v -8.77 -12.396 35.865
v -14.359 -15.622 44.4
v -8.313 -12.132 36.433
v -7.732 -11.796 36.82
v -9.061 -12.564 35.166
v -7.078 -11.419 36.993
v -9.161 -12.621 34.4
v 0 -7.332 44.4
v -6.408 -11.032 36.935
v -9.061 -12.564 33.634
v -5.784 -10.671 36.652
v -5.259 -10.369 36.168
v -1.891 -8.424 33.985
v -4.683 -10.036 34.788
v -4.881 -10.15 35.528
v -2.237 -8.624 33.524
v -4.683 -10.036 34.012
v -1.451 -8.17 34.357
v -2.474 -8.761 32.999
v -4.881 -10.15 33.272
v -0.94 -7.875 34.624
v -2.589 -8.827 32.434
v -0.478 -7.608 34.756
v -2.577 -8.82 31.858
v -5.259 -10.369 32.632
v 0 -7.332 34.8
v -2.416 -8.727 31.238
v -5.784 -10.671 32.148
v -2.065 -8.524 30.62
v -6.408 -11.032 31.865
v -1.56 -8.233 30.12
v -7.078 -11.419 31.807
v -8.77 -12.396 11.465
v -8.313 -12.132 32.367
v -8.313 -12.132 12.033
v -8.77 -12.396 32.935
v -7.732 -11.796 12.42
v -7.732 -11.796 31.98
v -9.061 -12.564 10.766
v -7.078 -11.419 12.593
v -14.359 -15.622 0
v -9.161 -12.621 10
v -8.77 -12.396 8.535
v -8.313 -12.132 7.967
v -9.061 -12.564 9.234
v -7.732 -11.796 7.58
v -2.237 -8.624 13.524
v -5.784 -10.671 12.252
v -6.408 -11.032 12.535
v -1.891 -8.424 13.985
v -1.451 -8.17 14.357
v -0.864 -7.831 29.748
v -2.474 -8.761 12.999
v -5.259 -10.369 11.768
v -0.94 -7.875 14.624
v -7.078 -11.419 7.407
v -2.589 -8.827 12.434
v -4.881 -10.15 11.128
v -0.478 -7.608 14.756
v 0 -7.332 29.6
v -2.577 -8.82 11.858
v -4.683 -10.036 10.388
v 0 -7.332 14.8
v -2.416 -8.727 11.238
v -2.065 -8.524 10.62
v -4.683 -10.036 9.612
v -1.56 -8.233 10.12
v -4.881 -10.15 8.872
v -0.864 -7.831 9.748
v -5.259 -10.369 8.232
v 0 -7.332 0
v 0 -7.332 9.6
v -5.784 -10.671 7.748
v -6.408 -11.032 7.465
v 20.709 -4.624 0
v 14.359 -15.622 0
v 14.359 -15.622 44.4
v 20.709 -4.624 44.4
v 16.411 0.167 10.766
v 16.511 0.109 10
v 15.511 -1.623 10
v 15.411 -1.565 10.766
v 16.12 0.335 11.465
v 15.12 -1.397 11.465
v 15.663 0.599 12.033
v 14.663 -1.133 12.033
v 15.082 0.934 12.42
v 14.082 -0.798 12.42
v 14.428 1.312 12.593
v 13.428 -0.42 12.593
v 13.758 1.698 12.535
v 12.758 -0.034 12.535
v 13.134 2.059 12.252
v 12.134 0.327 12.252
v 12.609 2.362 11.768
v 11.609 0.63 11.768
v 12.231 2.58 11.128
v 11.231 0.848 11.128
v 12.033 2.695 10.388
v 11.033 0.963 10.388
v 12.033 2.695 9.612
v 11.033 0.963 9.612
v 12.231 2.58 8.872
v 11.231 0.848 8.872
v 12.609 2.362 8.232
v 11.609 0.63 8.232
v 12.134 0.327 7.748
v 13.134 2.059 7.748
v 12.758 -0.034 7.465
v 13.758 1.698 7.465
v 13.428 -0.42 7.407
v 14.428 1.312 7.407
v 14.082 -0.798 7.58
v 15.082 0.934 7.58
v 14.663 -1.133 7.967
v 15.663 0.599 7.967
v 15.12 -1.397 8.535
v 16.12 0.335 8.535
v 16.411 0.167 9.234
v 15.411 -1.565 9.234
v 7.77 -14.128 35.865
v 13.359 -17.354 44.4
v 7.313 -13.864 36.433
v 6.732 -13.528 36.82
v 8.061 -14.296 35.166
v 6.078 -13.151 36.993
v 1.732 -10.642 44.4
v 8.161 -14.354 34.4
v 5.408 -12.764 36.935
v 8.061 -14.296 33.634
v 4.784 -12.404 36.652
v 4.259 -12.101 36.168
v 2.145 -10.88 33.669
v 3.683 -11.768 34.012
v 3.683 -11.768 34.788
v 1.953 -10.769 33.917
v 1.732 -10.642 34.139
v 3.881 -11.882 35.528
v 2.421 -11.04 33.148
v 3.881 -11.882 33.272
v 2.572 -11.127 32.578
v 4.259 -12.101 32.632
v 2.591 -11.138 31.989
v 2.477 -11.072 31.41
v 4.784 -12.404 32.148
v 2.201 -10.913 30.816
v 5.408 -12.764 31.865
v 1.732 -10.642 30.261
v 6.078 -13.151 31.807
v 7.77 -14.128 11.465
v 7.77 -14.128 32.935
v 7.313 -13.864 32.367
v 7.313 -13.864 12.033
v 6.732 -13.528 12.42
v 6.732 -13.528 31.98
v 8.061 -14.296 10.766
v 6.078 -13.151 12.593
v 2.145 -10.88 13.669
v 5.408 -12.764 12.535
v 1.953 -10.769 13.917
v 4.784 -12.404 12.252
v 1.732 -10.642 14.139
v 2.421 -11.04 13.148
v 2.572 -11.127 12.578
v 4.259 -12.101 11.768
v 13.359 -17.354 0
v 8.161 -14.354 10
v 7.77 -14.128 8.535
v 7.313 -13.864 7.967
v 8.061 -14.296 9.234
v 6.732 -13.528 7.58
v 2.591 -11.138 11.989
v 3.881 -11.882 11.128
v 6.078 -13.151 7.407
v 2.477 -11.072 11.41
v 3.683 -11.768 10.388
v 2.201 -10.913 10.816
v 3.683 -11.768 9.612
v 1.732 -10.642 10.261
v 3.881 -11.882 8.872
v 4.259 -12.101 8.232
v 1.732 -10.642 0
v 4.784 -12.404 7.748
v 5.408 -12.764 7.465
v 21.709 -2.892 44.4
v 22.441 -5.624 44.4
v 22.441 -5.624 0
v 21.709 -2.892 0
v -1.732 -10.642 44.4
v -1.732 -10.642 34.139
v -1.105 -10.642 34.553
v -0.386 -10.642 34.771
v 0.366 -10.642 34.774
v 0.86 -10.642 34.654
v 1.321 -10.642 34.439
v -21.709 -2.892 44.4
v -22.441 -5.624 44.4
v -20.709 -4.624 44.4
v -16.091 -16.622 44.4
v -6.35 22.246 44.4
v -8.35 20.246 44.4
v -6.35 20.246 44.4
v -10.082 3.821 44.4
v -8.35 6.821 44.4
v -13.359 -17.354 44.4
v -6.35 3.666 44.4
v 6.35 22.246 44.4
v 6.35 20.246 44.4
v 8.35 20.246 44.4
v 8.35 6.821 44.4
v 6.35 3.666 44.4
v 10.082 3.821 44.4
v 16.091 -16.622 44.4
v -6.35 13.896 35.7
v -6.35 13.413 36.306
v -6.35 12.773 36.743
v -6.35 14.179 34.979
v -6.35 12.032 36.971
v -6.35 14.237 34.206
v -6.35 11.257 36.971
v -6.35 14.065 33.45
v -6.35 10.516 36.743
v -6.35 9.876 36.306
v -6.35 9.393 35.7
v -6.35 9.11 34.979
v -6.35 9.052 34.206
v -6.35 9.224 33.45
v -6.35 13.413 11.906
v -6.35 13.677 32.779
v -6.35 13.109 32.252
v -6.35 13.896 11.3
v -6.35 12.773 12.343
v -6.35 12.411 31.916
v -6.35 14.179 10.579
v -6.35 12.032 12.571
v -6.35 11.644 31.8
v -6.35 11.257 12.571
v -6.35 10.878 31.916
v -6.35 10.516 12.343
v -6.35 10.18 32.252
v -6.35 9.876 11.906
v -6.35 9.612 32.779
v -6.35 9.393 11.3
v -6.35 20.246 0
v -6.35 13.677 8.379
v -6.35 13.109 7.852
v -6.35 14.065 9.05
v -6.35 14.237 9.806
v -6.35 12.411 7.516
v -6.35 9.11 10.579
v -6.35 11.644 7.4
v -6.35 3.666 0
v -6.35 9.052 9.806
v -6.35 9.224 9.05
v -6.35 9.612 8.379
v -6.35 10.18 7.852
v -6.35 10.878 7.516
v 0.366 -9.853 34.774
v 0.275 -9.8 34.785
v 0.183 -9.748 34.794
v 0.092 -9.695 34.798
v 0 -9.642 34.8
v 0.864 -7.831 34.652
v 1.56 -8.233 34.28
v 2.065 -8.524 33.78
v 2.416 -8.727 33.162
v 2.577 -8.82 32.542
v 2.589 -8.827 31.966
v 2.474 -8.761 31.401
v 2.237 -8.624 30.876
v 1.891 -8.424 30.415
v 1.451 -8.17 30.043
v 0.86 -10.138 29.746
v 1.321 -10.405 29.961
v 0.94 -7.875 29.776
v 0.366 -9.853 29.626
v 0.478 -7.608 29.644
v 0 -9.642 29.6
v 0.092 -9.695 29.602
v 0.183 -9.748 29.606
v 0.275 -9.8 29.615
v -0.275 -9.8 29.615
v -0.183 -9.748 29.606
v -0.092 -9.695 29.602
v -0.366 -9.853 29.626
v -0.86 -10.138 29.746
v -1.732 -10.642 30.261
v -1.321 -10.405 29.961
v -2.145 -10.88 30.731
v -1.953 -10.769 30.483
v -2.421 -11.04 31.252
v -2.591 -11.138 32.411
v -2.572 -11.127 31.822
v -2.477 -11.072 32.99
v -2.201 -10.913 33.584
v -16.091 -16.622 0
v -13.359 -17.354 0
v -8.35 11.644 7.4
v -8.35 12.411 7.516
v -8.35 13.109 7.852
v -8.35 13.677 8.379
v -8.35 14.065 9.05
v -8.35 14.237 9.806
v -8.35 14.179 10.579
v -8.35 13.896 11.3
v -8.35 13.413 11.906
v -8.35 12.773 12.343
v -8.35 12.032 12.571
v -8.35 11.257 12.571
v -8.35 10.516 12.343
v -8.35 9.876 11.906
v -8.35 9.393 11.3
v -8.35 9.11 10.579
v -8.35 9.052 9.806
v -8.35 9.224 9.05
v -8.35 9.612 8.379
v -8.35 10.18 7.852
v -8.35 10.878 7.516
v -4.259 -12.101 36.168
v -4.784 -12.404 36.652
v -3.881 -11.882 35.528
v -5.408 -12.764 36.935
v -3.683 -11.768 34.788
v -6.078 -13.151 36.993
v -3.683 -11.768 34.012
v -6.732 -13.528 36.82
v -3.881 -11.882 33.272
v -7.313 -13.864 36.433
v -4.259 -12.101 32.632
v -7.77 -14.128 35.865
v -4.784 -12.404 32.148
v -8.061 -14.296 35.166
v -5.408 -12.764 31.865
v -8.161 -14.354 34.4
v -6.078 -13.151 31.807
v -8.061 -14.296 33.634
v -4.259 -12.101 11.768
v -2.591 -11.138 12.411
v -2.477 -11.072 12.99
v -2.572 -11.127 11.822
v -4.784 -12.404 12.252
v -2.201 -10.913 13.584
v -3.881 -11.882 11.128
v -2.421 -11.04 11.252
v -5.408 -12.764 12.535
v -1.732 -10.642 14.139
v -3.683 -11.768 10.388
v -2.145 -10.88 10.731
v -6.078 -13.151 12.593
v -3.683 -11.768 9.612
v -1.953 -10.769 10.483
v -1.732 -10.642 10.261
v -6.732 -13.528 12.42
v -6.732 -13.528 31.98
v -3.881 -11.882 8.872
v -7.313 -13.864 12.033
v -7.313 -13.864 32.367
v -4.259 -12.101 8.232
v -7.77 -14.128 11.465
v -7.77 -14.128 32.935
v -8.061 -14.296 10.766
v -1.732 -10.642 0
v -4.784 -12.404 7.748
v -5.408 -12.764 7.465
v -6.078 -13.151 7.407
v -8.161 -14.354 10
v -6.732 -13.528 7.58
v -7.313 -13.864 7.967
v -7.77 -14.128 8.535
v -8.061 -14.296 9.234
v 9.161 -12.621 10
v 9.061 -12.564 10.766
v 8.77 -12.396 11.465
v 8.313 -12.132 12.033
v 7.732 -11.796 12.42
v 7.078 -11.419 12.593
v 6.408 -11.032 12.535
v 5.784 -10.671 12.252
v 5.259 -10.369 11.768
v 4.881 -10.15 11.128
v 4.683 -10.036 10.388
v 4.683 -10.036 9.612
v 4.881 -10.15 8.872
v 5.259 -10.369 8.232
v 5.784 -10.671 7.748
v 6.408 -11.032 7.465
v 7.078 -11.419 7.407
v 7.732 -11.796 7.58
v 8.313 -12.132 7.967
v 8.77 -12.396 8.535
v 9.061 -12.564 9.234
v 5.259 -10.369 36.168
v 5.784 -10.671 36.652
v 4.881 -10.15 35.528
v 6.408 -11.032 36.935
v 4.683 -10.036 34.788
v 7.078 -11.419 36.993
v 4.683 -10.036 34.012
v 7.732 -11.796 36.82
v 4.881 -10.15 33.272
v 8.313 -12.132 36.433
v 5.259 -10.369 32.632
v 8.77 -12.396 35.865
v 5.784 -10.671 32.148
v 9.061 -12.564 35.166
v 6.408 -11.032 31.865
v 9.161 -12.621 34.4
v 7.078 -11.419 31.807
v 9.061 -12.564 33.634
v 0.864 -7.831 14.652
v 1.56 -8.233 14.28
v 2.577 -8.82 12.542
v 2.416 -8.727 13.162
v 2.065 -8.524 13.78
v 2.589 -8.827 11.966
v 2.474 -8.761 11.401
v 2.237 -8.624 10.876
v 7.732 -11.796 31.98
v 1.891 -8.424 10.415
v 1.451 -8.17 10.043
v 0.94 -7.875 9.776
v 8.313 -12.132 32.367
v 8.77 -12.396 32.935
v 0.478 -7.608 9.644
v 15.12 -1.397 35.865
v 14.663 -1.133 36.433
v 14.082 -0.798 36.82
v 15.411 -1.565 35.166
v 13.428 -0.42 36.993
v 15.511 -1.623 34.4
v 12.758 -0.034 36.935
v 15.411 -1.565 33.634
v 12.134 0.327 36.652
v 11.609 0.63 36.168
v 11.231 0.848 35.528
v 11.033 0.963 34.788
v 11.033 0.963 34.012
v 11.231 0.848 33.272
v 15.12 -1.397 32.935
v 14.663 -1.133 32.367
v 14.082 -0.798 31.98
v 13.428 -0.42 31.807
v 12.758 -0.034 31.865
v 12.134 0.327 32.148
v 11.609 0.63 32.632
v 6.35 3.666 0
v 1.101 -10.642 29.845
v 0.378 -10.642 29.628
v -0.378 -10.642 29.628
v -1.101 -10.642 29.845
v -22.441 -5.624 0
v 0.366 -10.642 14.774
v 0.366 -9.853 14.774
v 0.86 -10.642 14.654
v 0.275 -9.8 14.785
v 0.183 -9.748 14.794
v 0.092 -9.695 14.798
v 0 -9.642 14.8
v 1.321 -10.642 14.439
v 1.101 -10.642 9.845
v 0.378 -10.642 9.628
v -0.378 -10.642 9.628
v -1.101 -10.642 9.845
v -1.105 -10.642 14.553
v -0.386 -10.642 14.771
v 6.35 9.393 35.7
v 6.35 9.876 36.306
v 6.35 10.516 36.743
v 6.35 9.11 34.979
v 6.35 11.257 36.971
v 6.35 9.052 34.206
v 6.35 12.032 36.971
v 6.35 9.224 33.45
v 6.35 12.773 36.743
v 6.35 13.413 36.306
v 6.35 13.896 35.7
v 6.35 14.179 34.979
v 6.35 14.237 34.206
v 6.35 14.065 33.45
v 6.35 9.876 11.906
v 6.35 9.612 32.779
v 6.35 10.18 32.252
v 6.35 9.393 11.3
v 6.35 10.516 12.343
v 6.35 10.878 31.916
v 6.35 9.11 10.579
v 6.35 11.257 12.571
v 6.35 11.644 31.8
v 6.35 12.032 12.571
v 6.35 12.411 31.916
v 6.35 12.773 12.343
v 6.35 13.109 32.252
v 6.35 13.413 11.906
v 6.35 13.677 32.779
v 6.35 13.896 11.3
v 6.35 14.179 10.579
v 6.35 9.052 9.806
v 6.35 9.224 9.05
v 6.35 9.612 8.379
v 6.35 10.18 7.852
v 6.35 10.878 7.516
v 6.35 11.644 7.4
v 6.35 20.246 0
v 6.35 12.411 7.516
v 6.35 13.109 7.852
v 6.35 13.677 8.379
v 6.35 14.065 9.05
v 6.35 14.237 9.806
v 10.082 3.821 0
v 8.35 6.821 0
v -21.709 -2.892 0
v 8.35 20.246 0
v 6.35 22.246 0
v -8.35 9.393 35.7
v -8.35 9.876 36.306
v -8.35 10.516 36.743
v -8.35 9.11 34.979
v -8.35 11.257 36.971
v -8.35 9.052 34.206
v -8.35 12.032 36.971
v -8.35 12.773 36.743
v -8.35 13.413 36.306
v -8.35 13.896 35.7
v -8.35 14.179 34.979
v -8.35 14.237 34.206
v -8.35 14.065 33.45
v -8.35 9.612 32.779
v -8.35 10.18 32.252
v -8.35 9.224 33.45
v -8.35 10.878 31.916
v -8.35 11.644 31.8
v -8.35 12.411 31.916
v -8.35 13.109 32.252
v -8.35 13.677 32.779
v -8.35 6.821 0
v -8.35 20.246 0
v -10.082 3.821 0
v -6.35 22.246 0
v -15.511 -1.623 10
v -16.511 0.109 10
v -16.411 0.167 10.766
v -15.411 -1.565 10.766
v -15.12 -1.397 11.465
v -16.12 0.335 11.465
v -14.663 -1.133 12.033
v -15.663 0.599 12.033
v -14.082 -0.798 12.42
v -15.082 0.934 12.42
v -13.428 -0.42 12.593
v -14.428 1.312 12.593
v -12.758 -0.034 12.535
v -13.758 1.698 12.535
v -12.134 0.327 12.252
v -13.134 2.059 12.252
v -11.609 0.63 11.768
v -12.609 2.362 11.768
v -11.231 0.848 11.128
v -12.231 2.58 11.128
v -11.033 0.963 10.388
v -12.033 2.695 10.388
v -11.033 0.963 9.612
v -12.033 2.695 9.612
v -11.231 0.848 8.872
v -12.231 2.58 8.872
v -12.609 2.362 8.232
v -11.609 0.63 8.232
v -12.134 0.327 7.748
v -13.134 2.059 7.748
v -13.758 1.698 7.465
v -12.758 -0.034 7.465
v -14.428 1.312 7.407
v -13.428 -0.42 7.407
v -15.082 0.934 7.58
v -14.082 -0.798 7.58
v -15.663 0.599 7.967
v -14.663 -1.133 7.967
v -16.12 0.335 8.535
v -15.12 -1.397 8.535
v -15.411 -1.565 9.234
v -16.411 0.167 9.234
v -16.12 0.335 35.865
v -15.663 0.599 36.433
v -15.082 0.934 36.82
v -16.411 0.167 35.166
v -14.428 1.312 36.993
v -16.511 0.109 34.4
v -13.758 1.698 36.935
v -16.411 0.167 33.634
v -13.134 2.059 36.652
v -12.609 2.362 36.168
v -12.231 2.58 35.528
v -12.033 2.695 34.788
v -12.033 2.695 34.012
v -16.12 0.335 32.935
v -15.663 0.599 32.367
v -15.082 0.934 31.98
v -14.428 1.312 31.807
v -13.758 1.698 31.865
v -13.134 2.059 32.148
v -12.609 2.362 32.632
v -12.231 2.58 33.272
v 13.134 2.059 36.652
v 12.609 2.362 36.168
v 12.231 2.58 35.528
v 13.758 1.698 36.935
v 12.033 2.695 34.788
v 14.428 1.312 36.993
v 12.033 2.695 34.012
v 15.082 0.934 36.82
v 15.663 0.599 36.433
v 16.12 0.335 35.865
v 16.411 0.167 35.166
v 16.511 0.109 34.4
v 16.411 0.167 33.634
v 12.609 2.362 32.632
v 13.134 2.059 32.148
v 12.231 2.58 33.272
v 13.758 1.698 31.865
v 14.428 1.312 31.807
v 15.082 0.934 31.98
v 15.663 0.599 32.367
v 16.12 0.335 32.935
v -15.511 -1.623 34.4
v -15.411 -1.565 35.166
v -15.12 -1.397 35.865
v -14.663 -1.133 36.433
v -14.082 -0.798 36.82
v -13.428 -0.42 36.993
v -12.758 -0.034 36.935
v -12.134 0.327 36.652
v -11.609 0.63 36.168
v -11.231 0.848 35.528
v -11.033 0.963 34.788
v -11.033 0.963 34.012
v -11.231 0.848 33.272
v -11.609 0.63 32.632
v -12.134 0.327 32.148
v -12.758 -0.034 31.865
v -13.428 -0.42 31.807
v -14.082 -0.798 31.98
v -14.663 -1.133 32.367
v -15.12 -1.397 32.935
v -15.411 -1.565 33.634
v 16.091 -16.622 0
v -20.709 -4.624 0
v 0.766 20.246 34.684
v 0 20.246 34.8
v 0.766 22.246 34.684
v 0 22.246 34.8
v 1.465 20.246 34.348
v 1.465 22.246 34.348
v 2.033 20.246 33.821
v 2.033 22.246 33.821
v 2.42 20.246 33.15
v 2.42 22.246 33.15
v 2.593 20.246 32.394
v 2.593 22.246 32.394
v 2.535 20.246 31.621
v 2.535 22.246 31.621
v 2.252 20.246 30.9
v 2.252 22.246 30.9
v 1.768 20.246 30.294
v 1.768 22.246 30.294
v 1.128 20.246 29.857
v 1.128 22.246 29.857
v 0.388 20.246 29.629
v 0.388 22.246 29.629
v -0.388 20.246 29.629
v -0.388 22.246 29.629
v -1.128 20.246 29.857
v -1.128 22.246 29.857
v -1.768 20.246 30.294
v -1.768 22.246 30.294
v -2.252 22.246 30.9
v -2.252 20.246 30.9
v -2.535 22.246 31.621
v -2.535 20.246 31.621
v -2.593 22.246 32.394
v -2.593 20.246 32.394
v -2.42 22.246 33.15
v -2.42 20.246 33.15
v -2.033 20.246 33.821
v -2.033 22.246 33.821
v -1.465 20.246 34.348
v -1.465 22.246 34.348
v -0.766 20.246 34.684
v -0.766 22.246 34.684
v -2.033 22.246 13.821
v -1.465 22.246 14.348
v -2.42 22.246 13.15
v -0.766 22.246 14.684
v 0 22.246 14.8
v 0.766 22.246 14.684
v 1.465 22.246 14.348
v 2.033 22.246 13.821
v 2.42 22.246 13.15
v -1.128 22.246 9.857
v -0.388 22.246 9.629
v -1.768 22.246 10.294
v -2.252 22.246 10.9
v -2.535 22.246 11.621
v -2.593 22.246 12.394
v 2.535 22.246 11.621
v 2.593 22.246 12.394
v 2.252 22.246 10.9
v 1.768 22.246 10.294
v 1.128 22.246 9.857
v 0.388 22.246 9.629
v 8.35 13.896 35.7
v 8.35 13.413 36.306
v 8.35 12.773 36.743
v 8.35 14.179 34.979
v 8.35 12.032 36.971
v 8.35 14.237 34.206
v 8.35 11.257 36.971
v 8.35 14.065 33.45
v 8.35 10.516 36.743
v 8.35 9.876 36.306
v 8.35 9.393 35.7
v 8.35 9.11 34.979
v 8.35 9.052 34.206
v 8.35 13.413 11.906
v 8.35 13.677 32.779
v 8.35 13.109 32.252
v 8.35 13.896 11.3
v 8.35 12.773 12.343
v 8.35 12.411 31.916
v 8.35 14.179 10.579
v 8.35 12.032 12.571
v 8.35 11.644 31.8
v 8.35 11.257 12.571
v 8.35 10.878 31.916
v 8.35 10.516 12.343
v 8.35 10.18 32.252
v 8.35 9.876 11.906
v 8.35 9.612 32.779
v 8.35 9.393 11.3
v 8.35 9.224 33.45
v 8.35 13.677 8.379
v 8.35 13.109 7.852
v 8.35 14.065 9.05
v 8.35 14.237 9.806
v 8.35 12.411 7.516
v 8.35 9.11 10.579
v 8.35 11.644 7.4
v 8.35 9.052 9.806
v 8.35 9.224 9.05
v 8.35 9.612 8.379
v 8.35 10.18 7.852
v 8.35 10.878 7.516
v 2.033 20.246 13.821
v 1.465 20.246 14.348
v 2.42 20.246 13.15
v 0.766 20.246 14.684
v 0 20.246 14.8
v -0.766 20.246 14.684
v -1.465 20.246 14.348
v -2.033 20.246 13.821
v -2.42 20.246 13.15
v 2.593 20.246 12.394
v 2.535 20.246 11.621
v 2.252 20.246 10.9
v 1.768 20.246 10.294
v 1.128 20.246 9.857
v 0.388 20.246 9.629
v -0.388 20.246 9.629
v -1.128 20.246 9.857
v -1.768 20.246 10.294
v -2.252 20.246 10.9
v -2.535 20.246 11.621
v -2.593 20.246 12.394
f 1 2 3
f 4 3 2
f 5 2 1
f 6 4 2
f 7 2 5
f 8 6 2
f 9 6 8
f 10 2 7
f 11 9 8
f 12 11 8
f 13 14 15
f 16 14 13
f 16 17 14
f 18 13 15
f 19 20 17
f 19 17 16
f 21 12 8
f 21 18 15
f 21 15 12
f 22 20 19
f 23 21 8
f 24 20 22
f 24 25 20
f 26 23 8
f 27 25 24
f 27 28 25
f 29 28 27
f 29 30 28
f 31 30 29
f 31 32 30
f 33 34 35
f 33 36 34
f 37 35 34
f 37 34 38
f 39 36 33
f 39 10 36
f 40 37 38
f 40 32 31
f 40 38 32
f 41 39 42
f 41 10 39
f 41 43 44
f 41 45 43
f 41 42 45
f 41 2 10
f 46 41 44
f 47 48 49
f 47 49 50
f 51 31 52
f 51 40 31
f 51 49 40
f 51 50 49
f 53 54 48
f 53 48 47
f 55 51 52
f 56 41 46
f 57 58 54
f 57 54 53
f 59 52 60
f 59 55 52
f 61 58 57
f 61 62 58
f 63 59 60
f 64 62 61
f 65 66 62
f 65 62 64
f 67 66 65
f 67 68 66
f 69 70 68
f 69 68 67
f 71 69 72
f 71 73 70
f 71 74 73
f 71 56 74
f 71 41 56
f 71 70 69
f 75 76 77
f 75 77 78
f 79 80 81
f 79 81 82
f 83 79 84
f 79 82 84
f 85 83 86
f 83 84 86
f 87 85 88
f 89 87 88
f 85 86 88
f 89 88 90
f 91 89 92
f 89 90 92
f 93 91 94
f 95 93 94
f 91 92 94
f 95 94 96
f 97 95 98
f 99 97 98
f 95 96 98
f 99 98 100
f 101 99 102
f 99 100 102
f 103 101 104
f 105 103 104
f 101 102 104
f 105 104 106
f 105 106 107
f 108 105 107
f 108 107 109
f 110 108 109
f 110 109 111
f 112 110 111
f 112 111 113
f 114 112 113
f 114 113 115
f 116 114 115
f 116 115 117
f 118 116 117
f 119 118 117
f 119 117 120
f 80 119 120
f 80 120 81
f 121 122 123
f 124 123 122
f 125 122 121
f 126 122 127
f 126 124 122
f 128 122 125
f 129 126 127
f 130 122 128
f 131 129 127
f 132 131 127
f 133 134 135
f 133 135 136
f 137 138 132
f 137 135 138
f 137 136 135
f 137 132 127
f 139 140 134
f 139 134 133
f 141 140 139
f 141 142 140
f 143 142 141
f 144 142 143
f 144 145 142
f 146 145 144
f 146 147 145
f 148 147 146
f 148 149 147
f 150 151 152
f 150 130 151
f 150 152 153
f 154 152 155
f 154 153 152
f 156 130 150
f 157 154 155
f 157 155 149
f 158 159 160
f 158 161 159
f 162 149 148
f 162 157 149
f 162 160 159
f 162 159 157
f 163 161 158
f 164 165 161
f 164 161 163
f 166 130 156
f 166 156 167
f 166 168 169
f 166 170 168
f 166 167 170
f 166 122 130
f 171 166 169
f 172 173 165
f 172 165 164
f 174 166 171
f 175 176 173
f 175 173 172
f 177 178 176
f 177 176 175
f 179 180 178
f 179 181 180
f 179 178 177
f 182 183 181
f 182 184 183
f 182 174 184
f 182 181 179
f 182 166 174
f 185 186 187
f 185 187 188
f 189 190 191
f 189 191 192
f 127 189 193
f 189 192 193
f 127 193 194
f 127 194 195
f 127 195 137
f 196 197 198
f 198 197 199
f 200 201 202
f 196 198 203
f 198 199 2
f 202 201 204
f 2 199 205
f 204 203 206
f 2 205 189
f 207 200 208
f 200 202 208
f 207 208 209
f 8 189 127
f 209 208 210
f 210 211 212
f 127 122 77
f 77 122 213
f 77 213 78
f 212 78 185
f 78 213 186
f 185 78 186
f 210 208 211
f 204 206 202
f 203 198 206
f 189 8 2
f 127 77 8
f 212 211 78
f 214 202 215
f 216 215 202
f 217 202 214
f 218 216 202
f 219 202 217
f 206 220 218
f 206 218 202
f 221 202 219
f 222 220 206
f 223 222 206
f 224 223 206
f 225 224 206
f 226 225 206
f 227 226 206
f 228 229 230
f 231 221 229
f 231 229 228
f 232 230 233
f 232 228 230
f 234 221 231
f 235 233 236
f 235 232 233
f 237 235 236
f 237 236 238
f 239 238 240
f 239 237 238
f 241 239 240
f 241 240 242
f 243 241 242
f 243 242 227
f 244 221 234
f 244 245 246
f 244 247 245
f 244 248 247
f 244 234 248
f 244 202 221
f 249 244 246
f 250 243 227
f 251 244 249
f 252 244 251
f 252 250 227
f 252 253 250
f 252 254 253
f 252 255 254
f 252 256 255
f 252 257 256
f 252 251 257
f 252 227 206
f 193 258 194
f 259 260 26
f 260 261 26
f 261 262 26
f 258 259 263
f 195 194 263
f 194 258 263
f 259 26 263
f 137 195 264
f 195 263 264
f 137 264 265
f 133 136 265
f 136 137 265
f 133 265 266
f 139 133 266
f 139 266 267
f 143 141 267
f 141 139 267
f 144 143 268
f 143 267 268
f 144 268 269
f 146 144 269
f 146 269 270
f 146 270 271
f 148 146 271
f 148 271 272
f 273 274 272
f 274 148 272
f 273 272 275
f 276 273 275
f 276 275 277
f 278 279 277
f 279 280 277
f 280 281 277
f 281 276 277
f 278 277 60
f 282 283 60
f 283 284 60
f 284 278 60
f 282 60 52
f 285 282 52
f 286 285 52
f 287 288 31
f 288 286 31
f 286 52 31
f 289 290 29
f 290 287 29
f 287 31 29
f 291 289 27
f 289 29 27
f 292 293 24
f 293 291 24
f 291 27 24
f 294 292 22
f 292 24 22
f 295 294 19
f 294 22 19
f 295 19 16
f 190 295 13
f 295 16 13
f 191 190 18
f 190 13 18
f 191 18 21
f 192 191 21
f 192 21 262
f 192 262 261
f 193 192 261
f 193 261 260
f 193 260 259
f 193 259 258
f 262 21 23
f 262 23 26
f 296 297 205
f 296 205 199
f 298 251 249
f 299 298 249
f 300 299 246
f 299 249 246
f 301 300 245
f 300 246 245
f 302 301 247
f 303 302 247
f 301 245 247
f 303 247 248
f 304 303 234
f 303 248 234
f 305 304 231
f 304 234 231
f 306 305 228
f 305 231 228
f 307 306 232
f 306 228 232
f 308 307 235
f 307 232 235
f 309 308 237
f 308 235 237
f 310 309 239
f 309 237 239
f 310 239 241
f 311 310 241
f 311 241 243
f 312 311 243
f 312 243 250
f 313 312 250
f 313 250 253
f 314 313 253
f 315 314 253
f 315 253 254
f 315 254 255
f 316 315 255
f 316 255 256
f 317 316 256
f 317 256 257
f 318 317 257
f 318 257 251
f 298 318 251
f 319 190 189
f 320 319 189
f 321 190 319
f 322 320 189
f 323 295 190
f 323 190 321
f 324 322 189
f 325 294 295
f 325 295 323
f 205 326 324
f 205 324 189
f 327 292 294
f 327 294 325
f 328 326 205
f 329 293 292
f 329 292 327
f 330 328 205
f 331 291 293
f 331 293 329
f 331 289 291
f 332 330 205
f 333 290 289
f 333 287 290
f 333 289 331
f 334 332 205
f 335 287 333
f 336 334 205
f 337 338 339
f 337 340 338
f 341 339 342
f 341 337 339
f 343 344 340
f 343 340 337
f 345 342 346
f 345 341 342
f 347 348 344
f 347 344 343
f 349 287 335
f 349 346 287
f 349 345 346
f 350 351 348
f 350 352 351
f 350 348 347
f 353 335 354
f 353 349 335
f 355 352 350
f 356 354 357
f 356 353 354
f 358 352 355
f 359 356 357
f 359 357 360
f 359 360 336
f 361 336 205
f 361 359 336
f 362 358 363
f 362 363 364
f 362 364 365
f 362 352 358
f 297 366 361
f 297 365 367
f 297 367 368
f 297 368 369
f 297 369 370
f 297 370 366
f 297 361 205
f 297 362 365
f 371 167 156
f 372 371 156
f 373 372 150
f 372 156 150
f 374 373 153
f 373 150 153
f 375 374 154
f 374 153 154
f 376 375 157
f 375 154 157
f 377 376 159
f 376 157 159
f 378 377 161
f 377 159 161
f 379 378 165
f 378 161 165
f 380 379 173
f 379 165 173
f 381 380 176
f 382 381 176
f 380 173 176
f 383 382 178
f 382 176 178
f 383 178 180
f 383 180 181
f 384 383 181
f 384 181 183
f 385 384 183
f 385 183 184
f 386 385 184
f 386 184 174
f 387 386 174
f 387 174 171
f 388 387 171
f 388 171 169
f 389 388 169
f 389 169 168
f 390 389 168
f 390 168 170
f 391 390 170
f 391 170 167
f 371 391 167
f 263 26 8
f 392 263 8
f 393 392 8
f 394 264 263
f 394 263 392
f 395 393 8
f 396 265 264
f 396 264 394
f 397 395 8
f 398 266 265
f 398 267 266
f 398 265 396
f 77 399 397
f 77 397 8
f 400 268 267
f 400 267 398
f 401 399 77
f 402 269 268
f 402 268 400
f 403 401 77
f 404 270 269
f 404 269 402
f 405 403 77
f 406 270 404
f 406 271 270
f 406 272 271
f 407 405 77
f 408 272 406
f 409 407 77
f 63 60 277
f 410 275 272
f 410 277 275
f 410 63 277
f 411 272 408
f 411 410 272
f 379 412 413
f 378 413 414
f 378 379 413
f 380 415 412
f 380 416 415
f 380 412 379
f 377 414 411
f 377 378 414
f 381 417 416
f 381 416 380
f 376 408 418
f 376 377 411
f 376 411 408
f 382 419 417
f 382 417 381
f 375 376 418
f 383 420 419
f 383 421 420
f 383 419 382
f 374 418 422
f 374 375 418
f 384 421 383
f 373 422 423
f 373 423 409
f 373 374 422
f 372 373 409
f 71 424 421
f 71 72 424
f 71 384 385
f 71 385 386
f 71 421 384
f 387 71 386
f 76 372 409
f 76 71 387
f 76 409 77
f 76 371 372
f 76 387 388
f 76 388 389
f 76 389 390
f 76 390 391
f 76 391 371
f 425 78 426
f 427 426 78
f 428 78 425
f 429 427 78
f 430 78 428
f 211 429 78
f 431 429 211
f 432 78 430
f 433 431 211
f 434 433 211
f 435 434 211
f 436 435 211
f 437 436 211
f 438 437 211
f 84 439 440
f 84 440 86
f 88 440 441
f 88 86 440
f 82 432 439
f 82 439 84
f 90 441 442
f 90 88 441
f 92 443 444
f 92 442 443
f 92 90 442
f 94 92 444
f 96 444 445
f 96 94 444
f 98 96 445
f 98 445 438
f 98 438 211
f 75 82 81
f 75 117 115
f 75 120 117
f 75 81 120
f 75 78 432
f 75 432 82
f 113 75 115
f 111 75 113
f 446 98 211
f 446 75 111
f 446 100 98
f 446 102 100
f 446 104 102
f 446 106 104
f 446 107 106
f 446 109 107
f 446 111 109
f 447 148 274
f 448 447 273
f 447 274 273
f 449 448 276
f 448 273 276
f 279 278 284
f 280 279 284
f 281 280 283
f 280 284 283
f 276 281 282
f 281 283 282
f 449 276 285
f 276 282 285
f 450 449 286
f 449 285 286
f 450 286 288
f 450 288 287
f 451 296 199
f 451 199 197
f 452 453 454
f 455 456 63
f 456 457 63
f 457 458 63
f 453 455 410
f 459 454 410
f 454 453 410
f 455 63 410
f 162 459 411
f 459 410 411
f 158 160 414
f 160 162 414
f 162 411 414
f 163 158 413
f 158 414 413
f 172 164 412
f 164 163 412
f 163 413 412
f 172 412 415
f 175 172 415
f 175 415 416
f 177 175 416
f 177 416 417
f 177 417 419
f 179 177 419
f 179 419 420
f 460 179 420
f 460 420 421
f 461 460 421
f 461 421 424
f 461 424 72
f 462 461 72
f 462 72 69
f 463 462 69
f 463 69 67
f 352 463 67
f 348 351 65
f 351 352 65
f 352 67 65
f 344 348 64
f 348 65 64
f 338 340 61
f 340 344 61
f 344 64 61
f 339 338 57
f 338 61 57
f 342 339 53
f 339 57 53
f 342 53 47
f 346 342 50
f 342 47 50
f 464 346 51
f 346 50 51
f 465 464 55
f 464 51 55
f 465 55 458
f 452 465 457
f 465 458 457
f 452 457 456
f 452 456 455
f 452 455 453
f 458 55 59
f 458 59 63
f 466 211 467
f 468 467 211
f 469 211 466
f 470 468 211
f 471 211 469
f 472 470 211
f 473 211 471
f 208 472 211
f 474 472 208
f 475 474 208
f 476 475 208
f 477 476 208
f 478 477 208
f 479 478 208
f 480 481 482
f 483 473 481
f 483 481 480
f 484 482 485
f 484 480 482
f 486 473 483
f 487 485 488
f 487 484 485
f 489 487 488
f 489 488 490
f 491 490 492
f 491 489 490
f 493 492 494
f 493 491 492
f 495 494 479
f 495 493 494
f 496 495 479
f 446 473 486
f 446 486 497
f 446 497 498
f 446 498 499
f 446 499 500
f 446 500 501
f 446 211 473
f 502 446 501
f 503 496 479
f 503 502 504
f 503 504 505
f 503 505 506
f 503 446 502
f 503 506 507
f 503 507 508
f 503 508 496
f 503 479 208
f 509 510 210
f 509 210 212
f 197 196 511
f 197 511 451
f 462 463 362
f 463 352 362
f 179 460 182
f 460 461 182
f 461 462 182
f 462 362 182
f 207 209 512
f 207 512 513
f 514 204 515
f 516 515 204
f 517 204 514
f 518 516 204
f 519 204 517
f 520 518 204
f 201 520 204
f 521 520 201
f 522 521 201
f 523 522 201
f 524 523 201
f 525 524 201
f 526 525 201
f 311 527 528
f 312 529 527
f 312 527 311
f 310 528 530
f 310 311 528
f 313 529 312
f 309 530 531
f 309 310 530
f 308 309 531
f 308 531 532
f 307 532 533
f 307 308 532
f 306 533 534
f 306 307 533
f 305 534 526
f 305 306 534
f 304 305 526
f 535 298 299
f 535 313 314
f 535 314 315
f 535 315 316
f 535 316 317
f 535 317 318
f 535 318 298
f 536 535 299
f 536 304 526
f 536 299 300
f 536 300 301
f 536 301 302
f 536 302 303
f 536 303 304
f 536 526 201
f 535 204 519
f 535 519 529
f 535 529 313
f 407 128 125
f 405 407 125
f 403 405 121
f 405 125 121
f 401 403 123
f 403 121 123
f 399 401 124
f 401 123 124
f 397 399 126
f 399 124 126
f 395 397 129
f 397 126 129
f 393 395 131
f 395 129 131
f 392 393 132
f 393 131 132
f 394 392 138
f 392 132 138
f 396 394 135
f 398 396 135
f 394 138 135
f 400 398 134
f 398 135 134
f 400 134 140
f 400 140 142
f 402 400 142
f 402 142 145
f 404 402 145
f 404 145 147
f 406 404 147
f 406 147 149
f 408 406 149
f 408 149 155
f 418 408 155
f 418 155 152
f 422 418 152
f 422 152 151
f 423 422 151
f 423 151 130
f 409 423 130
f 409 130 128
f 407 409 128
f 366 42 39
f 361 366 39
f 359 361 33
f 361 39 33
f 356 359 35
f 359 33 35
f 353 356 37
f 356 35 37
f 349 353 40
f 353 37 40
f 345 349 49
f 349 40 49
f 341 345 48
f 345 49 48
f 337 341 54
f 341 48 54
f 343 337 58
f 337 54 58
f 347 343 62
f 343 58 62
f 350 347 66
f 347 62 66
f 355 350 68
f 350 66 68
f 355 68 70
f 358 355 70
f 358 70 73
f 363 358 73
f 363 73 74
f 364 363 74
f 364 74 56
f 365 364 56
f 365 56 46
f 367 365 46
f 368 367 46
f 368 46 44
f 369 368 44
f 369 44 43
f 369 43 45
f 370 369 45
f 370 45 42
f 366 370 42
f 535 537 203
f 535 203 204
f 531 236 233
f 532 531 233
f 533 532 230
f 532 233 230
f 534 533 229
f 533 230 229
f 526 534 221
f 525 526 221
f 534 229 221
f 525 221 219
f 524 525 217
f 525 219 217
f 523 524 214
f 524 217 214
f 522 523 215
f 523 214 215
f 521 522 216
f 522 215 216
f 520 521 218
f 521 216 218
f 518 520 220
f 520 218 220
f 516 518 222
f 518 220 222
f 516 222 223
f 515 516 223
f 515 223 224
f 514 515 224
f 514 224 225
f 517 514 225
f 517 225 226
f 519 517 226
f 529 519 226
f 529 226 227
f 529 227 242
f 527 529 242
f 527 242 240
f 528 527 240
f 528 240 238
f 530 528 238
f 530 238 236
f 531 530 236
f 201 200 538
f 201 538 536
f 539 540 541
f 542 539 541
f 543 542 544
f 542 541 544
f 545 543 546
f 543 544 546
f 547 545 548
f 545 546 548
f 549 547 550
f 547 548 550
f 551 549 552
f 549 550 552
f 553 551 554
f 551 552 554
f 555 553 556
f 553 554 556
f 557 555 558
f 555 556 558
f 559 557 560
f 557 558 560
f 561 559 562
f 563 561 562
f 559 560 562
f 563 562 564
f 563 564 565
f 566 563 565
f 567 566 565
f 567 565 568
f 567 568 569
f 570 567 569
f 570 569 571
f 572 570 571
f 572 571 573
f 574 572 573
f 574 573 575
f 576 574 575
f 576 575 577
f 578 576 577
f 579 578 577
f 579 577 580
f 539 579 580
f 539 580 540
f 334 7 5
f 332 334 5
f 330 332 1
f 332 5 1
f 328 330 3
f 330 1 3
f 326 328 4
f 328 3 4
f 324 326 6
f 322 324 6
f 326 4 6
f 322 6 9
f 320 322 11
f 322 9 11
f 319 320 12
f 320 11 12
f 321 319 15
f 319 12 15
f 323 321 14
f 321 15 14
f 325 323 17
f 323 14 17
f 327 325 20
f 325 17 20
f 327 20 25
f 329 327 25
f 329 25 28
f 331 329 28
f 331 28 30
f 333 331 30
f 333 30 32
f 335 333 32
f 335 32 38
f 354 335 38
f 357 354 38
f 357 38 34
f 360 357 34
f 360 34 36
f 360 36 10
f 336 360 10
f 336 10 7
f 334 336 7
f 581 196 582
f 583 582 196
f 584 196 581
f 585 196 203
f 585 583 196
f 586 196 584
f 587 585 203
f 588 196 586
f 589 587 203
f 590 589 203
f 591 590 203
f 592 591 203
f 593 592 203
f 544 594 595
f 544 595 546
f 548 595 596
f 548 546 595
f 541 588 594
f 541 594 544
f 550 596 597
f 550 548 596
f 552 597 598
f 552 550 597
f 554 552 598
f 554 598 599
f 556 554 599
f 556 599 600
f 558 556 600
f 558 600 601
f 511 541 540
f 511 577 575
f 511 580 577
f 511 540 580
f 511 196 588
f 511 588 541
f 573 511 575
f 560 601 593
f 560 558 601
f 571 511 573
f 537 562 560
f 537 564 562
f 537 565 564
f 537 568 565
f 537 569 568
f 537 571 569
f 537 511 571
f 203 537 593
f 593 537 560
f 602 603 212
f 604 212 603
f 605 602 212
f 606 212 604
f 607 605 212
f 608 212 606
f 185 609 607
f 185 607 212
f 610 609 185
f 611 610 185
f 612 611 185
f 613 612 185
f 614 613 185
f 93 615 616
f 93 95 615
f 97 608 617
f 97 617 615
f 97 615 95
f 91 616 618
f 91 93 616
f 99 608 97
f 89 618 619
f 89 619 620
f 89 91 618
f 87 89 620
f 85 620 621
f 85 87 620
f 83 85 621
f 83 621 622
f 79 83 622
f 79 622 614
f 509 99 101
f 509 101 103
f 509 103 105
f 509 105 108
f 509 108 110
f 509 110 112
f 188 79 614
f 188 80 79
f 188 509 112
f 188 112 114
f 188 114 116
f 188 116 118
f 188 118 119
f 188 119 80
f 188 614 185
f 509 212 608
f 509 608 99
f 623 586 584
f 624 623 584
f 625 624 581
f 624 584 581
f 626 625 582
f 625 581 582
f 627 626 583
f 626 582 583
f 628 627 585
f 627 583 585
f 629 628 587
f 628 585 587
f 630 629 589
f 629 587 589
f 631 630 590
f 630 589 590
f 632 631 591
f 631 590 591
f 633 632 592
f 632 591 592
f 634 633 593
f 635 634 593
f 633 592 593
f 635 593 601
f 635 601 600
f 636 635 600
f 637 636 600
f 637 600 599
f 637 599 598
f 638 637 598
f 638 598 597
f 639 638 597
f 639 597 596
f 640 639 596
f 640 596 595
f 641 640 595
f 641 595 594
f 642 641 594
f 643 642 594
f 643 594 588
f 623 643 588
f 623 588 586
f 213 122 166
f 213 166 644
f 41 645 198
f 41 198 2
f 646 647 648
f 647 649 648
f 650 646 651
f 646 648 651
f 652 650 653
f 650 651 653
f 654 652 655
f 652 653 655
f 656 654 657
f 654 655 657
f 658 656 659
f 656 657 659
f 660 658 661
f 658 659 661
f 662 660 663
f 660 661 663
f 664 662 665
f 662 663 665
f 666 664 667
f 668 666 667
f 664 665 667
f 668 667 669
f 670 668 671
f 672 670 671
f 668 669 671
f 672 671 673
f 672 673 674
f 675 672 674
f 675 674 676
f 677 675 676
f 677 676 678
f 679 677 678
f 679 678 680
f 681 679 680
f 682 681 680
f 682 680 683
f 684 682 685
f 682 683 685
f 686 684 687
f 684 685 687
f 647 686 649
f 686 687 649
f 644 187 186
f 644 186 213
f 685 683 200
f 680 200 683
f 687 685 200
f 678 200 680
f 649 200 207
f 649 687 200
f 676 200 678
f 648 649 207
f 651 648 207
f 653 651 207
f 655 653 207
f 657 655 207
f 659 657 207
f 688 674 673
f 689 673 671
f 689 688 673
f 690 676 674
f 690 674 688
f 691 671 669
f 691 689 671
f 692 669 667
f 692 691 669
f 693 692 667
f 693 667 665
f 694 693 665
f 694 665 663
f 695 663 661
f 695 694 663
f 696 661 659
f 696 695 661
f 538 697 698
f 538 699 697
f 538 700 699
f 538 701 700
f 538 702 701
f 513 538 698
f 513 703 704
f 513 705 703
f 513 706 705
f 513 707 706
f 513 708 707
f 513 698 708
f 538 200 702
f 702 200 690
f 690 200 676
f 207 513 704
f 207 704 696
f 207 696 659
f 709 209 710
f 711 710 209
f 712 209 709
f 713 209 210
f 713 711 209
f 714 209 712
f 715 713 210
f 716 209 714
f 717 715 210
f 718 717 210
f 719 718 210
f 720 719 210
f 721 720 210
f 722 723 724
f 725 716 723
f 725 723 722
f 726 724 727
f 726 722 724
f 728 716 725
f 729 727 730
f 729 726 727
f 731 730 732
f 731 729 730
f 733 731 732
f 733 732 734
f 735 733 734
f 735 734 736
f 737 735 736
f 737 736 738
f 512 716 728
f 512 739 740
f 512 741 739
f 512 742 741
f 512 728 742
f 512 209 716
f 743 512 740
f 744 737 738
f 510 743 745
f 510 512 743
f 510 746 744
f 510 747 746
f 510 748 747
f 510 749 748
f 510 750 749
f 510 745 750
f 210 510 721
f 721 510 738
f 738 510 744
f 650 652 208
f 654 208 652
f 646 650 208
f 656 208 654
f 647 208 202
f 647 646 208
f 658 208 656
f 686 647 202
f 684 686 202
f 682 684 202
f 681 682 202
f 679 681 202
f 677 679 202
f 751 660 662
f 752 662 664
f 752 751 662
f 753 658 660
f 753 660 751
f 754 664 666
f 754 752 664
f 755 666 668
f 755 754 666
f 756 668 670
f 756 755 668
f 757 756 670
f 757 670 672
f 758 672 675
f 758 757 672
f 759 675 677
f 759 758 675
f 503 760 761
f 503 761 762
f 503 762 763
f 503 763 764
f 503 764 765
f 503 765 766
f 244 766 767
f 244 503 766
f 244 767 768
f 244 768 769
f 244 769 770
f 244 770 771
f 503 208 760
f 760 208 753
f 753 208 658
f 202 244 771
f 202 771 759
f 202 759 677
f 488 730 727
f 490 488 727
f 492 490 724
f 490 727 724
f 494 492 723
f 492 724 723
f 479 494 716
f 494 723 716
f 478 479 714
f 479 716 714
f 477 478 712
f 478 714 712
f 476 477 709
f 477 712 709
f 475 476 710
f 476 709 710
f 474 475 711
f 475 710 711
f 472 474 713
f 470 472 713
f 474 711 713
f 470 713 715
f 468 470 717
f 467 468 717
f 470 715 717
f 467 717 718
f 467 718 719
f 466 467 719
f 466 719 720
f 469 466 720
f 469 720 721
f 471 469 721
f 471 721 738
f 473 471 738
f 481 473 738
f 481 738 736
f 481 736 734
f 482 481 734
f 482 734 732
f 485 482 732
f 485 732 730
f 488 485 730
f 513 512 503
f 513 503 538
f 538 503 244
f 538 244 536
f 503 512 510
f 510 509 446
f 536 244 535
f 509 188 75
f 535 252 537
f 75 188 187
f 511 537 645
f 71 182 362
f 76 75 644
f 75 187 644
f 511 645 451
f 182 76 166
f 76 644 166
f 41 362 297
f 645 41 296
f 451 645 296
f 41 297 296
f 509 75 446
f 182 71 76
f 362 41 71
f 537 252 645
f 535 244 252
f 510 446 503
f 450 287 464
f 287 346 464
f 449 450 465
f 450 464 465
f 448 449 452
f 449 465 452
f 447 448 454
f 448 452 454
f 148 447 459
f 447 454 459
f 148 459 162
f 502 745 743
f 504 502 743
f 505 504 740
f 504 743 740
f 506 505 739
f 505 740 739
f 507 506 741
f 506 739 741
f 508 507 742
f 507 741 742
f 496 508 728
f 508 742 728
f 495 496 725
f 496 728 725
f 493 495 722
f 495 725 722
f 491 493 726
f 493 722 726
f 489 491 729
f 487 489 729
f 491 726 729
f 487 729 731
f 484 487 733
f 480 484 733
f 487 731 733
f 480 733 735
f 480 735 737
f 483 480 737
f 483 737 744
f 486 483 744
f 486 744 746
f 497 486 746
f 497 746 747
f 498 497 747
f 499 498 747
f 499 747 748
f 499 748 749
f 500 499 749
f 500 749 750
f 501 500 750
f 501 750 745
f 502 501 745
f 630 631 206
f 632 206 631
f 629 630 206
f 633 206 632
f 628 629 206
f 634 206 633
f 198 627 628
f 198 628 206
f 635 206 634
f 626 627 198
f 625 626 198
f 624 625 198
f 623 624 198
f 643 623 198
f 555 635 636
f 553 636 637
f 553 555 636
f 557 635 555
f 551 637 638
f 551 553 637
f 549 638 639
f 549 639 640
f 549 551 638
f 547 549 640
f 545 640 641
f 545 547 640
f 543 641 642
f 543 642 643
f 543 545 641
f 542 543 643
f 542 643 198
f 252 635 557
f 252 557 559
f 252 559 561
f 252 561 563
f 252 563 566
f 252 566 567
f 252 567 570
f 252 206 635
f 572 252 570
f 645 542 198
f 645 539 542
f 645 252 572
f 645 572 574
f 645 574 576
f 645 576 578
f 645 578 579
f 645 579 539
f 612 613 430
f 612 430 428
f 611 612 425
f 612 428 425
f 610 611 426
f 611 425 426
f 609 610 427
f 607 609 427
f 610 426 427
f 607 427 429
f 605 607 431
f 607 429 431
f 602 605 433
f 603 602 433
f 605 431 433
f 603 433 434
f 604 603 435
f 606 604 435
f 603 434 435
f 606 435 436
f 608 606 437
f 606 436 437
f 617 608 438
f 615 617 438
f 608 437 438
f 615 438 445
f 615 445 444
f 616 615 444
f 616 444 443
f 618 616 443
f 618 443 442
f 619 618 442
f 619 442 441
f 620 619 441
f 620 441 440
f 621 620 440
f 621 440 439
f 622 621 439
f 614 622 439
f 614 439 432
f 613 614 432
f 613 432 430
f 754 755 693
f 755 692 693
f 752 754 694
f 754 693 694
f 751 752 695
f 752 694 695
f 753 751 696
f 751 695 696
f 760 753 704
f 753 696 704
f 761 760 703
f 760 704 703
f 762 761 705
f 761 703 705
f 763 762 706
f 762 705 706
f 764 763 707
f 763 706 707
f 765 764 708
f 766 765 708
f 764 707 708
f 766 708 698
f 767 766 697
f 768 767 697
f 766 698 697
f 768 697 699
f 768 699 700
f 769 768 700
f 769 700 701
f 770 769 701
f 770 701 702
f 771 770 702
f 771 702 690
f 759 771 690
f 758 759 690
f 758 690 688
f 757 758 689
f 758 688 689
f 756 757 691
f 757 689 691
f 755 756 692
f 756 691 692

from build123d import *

# Parameters (mm, degrees)
BOSS_EXTRUDE1_DEPTH = 44.4
SKETCH4_R           = 2.6
CUT_EXTRUDE1_DEPTH  = 59.211840581
SKETCH6_R           = 2.6
CUT_EXTRUDE2_DEPTH  = 65.569616831
CHAMFER1_SIZE       = 2
SKETCH7_R           = 2.6
CUT_EXTRUDE3_DEPTH  = 59.43220581
SKETCH9_R           = 2.6
CUT_EXTRUDE4_DEPTH  = 60.570802035


with BuildPart() as part:
    # Sketch1 → Boss-Extrude1 (new body)
    with BuildSketch(Plane.XY):
        Polygon((-8.35, 22.246174209), (-8.35, 4.820874748), (-23.440752002, -3.891774983), (-15.090752002, -18.354399226), (0, -9.641749495), (15.090752002, -18.354399226), (23.440752002, -3.891774983), (8.35, 4.820874748), (8.35, 22.246174209), align=None)
        Polygon((-20.708701195, -4.623825791), (-6.35, 3.666174209), (-6.35, 20.246174209), (6.35, 20.246174209), (6.35, 3.666174209), (20.708701195, -4.623825791), (14.358701195, -15.622348419), (0, -7.332348419), (-14.358701195, -15.622348419), align=None, mode=Mode.SUBTRACT)
    extrude(amount=BOSS_EXTRUDE1_DEPTH)

    # Sketch4 → Cut-Extrude1 (cut, through all)
    with BuildSketch(Plane(origin=(-4.175, 7.231312122, 0), x_dir=(0.8660254037844606, 0.4999999999999621, 0), z_dir=(-0.4999999999999621, 0.8660254037844606, 0))):
        with Locations((-11.644441584, -10)):
            Circle(SKETCH4_R)
        with Locations((-11.644441584, -34.4)):
            Circle(SKETCH4_R)
    extrude(amount=-CUT_EXTRUDE1_DEPTH, mode=Mode.SUBTRACT)

    # Sketch6 → Cut-Extrude2 (cut, through all)
    with BuildSketch(Plane(origin=(0, 22.246174209, 0), x_dir=(1, 0, 0), z_dir=(0, 1, 0))):
        with Locations((0, -12.2)):
            Circle(SKETCH6_R)
        with Locations((0, -32.2)):
            Circle(SKETCH6_R)
    extrude(amount=-CUT_EXTRUDE2_DEPTH, mode=Mode.SUBTRACT)

    # Chamfer1
    chamfer1_edges = [part.edges().sort_by_distance(p)[0] for p in [
        (-8.35, 4.820874748, 22.2),
        (-8.35, 22.246174209, 22.2),
        (8.35, 22.246174209, 22.2),
        (8.35, 4.820874748, 22.2),
        (23.440752002, -3.891774983, 22.2),
        (0, -9.641749495, 4.8),
        (0, -9.641749495, 22.2),
        (15.090752002, -18.354399226, 22.2),
        (0, -9.641749495, 39.6),
        (-23.440752002, -3.891774983, 22.2),
        (-15.090752002, -18.354399226, 22.2),
    ]]
    chamfer(chamfer1_edges, length=CHAMFER1_SIZE)

    # Sketch7 → Cut-Extrude3 (cut, through all)
    with BuildSketch(Plane(origin=(8.35, 0, 0), x_dir=(0, 0, -1), z_dir=(1, 0, 0))):
        with Locations((-10, 11.644441584)):
            Circle(SKETCH7_R)
        with Locations((-34.4, 11.644441584)):
            Circle(SKETCH7_R)
    extrude(amount=-CUT_EXTRUDE3_DEPTH, mode=Mode.SUBTRACT)

    # Sketch9 → Cut-Extrude4 (cut, through all)
    with BuildSketch(Plane(origin=(-4.175, -7.231312122, 0), x_dir=(0.8660254037844506, -0.49999999999997924, 0), z_dir=(-0.4999999999999793, -0.8660254037844507, 0))):
        with Locations((11.644441584, 34.4)):
            Circle(SKETCH9_R)
        with Locations((11.644441584, 10)):
            Circle(SKETCH9_R)
    extrude(amount=-CUT_EXTRUDE4_DEPTH, mode=Mode.SUBTRACT)


solid = part.part
